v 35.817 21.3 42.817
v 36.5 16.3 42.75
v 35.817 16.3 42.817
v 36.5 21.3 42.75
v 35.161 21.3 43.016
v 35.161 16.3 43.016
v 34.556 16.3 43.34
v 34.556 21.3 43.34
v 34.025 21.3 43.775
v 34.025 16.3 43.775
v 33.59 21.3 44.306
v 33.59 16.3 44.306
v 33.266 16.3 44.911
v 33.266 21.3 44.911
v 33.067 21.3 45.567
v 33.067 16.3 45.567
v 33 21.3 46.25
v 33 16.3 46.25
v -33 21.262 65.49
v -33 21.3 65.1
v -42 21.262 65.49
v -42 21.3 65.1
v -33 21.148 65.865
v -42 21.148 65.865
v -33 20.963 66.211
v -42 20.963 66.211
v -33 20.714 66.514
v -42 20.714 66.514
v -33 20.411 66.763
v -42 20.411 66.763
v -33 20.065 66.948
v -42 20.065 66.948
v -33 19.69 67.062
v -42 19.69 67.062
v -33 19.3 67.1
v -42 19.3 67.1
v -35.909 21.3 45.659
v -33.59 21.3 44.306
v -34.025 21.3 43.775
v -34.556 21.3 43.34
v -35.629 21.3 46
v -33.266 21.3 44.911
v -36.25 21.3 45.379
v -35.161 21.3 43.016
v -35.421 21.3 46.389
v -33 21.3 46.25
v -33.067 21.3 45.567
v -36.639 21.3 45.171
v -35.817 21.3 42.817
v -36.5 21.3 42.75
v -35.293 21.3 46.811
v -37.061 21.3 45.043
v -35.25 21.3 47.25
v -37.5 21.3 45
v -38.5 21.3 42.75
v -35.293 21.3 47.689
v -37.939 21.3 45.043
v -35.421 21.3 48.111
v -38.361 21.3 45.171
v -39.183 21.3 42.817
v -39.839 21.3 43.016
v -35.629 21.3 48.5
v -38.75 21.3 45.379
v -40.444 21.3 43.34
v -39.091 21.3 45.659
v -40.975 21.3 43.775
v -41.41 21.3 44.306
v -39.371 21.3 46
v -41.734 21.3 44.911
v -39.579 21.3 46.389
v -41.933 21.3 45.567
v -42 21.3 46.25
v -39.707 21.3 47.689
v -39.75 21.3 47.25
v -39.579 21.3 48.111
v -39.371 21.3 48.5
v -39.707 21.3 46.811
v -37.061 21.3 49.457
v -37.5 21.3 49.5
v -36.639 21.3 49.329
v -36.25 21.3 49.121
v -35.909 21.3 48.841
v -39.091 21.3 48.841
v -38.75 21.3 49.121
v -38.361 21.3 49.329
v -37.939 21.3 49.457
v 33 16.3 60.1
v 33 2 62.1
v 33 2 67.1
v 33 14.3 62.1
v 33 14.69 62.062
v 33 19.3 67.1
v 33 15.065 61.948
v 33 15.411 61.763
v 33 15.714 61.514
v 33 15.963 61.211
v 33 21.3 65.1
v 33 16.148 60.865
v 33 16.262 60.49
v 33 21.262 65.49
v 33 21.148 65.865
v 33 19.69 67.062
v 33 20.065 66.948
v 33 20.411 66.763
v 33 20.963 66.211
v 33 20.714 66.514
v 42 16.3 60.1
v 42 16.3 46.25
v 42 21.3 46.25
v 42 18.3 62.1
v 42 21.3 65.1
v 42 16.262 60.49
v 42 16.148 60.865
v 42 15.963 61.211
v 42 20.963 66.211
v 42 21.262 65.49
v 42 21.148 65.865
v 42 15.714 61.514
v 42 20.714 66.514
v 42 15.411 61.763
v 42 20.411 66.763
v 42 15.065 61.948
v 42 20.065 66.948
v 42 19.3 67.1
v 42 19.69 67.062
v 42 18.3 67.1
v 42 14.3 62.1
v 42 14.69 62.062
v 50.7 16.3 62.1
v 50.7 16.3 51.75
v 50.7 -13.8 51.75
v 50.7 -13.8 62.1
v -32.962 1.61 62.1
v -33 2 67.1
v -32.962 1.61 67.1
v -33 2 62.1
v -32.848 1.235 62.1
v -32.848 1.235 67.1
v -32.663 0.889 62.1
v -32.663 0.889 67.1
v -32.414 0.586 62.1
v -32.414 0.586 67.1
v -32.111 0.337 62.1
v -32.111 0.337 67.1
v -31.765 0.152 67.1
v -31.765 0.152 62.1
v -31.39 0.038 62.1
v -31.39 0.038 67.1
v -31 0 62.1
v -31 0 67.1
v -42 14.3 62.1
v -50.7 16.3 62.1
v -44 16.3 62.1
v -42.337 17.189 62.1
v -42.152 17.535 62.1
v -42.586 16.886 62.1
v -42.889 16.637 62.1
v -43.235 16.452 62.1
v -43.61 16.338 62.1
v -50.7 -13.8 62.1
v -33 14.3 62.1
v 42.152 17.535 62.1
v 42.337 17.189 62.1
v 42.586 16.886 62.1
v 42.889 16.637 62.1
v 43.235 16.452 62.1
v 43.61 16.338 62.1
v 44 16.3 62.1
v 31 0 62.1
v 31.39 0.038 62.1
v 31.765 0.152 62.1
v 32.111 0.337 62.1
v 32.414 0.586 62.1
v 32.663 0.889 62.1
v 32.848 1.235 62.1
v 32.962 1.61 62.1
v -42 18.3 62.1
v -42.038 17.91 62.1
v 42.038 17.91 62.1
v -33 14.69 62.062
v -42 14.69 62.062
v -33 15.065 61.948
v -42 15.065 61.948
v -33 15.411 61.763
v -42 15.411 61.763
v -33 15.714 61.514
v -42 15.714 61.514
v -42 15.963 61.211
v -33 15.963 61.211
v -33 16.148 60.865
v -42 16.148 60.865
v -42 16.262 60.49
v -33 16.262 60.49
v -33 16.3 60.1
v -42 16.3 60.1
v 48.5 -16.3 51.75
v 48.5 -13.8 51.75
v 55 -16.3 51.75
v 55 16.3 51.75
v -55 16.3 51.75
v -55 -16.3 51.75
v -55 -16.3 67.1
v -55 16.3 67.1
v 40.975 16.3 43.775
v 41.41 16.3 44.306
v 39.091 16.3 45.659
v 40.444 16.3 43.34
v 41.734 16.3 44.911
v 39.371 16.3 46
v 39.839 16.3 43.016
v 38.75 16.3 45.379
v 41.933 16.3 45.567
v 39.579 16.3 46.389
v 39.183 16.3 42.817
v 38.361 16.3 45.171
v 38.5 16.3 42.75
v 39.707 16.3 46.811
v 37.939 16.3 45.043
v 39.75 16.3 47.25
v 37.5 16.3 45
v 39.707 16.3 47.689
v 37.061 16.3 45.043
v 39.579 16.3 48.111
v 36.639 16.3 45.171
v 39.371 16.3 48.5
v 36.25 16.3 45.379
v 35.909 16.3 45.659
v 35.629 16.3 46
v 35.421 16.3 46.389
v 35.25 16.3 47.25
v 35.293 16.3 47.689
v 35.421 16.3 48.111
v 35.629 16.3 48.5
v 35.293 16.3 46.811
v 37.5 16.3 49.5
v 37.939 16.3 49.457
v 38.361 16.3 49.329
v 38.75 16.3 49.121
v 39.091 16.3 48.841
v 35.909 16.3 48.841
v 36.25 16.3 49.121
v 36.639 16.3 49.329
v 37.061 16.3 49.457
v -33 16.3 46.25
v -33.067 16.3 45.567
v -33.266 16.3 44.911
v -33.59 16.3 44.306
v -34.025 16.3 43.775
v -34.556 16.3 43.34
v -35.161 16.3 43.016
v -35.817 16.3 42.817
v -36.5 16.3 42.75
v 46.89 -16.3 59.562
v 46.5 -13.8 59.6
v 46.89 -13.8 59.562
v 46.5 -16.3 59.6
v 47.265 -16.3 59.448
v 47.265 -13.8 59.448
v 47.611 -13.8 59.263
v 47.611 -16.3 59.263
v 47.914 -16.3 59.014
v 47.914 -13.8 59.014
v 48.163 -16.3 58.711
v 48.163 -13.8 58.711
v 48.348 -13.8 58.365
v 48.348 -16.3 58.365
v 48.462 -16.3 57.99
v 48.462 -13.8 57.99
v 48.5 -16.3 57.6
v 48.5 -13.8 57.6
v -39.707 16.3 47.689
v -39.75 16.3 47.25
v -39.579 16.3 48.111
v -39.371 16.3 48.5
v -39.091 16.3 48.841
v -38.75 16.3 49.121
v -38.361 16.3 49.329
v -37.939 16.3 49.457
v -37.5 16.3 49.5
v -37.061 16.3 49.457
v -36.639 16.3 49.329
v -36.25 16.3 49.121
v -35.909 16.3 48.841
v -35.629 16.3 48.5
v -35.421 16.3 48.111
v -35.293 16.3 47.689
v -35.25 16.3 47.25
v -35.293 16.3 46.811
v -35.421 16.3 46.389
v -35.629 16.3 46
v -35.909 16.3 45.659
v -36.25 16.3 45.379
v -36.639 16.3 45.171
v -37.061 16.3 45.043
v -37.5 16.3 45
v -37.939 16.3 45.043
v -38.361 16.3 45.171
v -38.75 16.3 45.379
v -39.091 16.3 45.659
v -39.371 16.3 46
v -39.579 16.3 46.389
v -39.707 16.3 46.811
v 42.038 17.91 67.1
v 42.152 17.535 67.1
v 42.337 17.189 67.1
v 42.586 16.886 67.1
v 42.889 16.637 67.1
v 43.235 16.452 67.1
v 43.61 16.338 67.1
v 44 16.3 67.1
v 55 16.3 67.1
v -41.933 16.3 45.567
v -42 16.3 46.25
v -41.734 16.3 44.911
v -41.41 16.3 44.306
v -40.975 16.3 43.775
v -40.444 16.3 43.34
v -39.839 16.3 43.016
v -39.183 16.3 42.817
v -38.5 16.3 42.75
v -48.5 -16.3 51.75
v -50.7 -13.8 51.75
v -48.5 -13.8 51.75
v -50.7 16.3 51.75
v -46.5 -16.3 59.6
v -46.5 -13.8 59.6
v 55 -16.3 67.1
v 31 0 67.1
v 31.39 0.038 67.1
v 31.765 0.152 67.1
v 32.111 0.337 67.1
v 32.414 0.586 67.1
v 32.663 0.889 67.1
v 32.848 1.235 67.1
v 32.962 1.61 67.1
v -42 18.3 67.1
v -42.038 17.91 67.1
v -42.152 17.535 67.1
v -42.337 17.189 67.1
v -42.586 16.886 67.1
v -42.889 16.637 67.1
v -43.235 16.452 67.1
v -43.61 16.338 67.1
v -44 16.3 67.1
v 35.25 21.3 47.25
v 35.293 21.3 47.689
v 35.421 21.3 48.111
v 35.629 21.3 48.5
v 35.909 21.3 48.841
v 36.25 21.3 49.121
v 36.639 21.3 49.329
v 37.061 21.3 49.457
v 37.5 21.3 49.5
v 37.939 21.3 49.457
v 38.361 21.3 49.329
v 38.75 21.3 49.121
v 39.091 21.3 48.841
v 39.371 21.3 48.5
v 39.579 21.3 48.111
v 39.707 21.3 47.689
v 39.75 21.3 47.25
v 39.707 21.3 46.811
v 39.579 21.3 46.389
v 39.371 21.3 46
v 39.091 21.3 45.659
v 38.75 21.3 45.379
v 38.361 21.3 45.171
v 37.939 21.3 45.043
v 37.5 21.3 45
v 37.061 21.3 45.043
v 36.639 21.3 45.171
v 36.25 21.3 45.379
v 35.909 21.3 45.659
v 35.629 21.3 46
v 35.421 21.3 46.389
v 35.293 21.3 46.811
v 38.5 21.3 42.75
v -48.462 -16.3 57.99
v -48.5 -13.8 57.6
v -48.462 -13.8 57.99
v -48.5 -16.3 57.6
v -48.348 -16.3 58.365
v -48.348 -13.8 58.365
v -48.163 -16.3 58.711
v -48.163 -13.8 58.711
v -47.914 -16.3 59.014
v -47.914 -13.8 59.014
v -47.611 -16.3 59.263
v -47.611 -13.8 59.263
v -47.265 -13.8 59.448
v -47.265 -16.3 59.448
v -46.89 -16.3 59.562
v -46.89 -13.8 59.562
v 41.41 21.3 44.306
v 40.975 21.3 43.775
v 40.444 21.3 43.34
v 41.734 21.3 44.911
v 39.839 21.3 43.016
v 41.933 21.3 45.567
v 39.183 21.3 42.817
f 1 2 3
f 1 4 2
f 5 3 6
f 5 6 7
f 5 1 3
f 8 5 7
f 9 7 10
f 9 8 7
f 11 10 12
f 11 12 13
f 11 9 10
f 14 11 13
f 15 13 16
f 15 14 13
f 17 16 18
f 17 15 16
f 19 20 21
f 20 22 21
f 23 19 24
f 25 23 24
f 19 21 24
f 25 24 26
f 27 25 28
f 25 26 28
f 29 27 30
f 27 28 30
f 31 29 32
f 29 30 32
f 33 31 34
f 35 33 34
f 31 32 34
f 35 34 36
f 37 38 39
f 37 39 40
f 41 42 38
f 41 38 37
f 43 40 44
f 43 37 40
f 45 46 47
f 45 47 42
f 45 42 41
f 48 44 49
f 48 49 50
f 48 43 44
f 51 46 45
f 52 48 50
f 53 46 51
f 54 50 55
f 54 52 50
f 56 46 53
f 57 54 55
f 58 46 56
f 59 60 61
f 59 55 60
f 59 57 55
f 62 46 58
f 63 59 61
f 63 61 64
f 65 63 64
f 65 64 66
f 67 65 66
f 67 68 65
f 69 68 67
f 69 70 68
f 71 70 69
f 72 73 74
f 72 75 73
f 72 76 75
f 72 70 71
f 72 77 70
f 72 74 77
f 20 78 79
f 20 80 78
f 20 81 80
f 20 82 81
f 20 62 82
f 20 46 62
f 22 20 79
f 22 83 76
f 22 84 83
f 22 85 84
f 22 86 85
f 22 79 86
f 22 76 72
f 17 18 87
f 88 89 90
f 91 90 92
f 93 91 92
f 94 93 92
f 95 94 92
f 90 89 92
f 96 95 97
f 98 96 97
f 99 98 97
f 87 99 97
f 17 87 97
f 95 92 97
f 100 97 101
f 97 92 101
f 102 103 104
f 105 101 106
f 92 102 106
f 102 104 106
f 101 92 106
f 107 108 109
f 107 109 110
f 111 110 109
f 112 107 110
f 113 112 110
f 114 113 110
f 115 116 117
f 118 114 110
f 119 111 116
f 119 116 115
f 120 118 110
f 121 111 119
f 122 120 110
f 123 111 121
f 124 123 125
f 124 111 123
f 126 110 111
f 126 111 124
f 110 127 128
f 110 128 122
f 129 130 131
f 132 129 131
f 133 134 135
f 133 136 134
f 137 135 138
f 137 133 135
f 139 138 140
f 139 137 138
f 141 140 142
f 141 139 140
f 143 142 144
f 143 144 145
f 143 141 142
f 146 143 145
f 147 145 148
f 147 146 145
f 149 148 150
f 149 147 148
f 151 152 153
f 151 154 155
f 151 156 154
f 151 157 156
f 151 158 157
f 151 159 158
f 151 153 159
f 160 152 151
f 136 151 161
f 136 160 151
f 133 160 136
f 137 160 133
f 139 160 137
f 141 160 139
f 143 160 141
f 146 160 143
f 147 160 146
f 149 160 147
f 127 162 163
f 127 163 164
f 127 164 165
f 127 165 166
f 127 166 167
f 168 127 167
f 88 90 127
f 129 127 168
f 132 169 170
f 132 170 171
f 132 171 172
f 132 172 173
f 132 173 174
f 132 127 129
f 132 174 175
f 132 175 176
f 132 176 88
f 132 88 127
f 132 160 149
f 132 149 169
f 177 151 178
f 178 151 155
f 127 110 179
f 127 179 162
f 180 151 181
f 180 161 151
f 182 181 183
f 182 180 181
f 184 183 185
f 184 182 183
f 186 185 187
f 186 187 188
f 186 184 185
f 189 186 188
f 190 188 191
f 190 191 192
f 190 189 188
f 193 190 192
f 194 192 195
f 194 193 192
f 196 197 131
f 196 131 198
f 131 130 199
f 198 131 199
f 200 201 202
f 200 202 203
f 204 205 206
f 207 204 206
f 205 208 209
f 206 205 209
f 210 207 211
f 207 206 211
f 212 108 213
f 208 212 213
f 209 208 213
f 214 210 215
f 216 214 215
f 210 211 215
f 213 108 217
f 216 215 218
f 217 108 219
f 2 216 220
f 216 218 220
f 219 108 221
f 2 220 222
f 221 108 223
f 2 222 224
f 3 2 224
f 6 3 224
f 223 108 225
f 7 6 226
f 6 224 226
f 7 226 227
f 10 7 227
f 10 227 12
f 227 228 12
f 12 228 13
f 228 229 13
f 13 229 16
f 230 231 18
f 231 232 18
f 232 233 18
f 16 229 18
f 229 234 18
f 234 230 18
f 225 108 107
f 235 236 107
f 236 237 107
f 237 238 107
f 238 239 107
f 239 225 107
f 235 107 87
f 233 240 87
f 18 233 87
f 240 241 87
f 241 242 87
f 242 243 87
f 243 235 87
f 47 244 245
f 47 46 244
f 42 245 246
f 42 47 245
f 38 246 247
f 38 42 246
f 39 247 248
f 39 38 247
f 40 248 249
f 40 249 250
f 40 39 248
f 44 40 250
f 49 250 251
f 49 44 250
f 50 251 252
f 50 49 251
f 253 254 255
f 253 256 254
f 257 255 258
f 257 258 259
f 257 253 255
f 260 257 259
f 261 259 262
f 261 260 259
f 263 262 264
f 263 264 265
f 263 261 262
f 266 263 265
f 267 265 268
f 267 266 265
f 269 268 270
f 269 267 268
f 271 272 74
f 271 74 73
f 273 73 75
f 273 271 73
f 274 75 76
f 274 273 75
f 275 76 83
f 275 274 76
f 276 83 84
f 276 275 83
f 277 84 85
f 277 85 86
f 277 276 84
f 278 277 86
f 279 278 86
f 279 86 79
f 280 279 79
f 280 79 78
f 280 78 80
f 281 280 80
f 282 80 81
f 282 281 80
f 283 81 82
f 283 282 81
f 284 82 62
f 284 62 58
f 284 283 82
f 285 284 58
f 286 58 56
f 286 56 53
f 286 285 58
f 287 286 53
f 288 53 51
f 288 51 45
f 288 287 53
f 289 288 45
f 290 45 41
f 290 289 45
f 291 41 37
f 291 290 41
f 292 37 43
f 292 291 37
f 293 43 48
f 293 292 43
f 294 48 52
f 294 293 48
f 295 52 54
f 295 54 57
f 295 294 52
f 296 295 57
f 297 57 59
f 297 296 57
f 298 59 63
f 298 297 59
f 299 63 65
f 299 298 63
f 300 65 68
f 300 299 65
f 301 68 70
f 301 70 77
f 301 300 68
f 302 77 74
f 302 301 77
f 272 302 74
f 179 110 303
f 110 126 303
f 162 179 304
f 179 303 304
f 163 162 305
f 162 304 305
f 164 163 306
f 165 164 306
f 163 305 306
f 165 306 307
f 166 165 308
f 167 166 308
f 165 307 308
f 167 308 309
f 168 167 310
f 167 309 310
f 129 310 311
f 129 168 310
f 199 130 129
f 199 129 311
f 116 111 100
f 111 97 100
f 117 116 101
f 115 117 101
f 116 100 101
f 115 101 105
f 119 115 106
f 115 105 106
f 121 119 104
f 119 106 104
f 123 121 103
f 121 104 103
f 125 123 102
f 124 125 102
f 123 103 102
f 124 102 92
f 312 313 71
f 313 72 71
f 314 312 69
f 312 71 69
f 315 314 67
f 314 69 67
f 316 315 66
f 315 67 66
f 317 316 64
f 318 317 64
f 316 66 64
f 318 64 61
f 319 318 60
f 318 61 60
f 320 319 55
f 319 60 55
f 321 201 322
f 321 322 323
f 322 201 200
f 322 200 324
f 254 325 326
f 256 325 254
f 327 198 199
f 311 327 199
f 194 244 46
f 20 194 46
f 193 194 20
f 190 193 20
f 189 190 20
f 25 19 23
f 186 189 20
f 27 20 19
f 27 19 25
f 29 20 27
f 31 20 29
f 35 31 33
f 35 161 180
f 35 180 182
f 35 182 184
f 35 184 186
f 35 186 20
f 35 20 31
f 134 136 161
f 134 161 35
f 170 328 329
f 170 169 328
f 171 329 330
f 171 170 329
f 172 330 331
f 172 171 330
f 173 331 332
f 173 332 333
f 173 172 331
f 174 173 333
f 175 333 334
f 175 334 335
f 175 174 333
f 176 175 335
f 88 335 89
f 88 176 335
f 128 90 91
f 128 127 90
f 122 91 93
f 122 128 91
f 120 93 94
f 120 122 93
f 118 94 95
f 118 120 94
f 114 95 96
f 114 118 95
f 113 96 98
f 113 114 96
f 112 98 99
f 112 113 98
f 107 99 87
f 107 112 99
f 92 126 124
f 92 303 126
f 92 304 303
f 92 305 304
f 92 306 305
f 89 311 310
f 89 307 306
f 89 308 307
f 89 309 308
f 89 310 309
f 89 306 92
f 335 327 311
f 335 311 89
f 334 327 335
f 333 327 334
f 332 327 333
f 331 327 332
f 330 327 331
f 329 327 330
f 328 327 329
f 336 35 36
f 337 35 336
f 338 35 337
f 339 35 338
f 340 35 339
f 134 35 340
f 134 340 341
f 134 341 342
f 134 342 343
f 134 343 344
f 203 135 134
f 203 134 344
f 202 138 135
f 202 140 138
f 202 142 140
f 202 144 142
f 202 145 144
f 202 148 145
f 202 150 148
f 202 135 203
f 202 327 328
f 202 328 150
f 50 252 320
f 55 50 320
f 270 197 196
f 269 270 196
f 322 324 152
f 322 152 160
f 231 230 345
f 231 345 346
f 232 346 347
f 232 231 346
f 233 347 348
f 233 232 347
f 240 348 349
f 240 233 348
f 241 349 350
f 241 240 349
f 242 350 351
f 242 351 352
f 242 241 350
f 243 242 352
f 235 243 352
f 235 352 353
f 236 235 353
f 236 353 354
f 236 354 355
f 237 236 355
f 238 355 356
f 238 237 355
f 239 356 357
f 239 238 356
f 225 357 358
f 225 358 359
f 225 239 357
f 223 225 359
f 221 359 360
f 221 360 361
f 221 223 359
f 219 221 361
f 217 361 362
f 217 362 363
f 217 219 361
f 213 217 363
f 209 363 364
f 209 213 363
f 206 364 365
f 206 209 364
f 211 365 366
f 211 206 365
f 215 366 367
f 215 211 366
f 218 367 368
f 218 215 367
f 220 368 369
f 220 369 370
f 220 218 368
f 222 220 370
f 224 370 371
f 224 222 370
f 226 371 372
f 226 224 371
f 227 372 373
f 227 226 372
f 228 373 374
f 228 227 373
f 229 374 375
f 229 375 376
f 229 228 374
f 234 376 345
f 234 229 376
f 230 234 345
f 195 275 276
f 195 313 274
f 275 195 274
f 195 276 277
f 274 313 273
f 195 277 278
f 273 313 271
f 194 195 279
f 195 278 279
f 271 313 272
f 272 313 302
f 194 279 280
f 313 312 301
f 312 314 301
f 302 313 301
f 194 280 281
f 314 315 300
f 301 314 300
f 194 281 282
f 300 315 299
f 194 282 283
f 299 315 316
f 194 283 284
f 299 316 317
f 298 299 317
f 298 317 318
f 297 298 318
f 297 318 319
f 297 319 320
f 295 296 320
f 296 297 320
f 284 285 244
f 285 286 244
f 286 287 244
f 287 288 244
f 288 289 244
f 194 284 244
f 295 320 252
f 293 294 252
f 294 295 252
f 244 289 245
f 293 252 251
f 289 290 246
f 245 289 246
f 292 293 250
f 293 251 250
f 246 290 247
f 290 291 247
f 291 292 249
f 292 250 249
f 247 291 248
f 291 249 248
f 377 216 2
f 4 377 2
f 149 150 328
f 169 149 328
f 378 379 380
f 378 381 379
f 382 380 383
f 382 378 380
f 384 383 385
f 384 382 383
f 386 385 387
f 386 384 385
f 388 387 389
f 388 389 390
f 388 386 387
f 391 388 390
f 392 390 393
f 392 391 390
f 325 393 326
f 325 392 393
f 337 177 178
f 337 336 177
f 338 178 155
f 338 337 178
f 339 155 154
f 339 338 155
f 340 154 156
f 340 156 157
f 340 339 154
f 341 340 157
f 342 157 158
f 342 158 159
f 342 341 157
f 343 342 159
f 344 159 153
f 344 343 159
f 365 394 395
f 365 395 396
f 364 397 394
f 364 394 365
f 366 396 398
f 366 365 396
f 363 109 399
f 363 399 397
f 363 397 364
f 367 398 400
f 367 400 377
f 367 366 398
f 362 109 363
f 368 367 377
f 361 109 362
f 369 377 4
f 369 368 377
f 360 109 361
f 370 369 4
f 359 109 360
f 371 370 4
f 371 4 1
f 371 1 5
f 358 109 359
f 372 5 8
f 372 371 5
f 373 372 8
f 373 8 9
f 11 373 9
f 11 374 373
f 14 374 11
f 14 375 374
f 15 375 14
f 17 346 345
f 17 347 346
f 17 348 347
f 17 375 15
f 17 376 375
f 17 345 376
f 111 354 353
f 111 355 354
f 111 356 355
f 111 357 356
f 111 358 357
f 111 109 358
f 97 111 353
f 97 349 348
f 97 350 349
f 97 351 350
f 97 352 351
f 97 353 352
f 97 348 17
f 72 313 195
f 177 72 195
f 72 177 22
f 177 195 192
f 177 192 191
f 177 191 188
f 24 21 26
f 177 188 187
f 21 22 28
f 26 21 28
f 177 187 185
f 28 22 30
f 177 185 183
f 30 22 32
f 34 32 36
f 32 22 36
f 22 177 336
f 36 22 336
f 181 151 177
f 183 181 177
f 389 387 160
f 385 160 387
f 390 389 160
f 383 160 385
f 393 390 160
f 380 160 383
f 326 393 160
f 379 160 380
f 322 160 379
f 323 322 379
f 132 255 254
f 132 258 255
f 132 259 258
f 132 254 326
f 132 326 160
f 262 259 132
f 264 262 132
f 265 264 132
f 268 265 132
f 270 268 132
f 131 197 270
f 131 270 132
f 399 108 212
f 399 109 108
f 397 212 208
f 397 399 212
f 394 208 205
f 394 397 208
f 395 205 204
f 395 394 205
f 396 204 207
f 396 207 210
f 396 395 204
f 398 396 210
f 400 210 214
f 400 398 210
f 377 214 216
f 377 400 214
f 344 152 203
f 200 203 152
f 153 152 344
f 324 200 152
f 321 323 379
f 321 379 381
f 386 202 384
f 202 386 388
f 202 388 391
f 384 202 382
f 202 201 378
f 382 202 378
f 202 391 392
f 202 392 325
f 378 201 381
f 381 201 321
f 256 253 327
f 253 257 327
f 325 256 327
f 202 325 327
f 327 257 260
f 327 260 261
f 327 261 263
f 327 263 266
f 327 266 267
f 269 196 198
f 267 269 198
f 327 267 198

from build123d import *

# Parameters (mm, degrees)
SKETCH045_W     = 110
SKETCH045_H     = 32.6
PAD025_DEPTH    = 15.35
SKETCH046_W     = 9
SKETCH046_H     = 24.35
SKETCH046_R     = 2.25
PAD026_DEPTH    = 5
FILLET018_R     = 3.5
SKETCH047_W     = 101.4
SKETCH047_H     = 30.1
POCKET021_DEPTH = 10.35
SKETCH048_W     = 97
SKETCH048_H     = 2.5
POCKET022_DEPTH = 7.85
FILLET019_R     = 2
SKETCH049_W     = 66
SKETCH049_H     = 16.3
POCKET023_DEPTH = 5
FILLET020_R     = 2
FILLET021_R     = 2


with BuildPart() as part:
    # Sketch045 → Pad025 (new body)
    with BuildSketch(Plane.XY):
        Rectangle(SKETCH045_W, SKETCH045_H)
    extrude(amount=PAD025_DEPTH)

    # Sketch046 (on Face1 of Pad025) → Pad026 (join)
    with BuildSketch(Plane(origin=(0, 16.3, 0), x_dir=(-1, 0, 0), z_dir=(0, 1, 0))):
        with Locations((-37.5, 3.175)):
            Rectangle(SKETCH046_W, SKETCH046_H)
        with Locations((-37.5, -4.5)):
            Circle(SKETCH046_R, mode=Mode.SUBTRACT)
        with Locations((37.5, 3.175)):
            Rectangle(SKETCH046_W, SKETCH046_H)
        with Locations((37.5, -4.5)):
            Circle(SKETCH046_R, mode=Mode.SUBTRACT)
    extrude(amount=PAD026_DEPTH)

    # Fillet018
    fillet018_edges = [part.edges().sort_by_distance(p)[0] for p in [
        (42, 18.8, -9),
        (33, 18.8, -9),
        (-33, 18.8, -9),
        (-42, 18.8, -9),
    ]]
    fillet(fillet018_edges, radius=FILLET018_R)

    # Sketch047 (on Face7 of Fillet018) → Pocket021 (cut)
    with BuildSketch(Plane(origin=(0, 0, 0), x_dir=(1, 0, 0), z_dir=(0, 0, -1))):
        with Locations((0, -1.25)):
            Rectangle(SKETCH047_W, SKETCH047_H)
    extrude(amount=-POCKET021_DEPTH, mode=Mode.SUBTRACT)

    # Sketch048 (on Face12 of Pocket021) → Pocket022 (cut)
    with BuildSketch(Plane(origin=(0, 0, 0), x_dir=(1, 0, 0), z_dir=(0, 0, -1))):
        with Locations((0, 15.05)):
            Rectangle(SKETCH048_W, SKETCH048_H)
    extrude(amount=-POCKET022_DEPTH, mode=Mode.SUBTRACT)

    # Fillet019
    fillet019_edges = [part.edges().sort_by_distance(p)[0] for p in [
        (-48.5, -15.05, 7.85),
        (48.5, -15.05, 7.85),
    ]]
    fillet(fillet019_edges, radius=FILLET019_R)

    # Sketch049 (on Face20 of Fillet019) → Pocket023 (cut)
    with BuildSketch(Plane.XY.offset(15.35)):
        with Locations((0, 8.15)):
            Rectangle(SKETCH049_W, SKETCH049_H)
    extrude(amount=-POCKET023_DEPTH, mode=Mode.SUBTRACT)

    # Fillet020
    fillet020_edges = [part.edges().sort_by_distance(p)[0] for p in [
        (-33, 0, 12.85),
        (33, 0, 12.85),
        (-37.5, 16.3, 10.35),
        (37.5, 16.3, 10.35),
        (37.5, 21.3, 15.35),
        (-37.5, 21.3, 15.35),
    ]]
    fillet(fillet020_edges, radius=FILLET020_R)

    # Fillet021
    fillet021_edges = [part.edges().sort_by_distance(p)[0] for p in [
        (42, 16.3, 12.85),
        (-42, 16.3, 12.85),
    ]]
    fillet(fillet021_edges, radius=FILLET021_R)


with BuildPart() as part_1:
    # Body011 placement: moved
    add(part.part.moved(Location((0, 0, 51.75))))


solid = part_1.part
